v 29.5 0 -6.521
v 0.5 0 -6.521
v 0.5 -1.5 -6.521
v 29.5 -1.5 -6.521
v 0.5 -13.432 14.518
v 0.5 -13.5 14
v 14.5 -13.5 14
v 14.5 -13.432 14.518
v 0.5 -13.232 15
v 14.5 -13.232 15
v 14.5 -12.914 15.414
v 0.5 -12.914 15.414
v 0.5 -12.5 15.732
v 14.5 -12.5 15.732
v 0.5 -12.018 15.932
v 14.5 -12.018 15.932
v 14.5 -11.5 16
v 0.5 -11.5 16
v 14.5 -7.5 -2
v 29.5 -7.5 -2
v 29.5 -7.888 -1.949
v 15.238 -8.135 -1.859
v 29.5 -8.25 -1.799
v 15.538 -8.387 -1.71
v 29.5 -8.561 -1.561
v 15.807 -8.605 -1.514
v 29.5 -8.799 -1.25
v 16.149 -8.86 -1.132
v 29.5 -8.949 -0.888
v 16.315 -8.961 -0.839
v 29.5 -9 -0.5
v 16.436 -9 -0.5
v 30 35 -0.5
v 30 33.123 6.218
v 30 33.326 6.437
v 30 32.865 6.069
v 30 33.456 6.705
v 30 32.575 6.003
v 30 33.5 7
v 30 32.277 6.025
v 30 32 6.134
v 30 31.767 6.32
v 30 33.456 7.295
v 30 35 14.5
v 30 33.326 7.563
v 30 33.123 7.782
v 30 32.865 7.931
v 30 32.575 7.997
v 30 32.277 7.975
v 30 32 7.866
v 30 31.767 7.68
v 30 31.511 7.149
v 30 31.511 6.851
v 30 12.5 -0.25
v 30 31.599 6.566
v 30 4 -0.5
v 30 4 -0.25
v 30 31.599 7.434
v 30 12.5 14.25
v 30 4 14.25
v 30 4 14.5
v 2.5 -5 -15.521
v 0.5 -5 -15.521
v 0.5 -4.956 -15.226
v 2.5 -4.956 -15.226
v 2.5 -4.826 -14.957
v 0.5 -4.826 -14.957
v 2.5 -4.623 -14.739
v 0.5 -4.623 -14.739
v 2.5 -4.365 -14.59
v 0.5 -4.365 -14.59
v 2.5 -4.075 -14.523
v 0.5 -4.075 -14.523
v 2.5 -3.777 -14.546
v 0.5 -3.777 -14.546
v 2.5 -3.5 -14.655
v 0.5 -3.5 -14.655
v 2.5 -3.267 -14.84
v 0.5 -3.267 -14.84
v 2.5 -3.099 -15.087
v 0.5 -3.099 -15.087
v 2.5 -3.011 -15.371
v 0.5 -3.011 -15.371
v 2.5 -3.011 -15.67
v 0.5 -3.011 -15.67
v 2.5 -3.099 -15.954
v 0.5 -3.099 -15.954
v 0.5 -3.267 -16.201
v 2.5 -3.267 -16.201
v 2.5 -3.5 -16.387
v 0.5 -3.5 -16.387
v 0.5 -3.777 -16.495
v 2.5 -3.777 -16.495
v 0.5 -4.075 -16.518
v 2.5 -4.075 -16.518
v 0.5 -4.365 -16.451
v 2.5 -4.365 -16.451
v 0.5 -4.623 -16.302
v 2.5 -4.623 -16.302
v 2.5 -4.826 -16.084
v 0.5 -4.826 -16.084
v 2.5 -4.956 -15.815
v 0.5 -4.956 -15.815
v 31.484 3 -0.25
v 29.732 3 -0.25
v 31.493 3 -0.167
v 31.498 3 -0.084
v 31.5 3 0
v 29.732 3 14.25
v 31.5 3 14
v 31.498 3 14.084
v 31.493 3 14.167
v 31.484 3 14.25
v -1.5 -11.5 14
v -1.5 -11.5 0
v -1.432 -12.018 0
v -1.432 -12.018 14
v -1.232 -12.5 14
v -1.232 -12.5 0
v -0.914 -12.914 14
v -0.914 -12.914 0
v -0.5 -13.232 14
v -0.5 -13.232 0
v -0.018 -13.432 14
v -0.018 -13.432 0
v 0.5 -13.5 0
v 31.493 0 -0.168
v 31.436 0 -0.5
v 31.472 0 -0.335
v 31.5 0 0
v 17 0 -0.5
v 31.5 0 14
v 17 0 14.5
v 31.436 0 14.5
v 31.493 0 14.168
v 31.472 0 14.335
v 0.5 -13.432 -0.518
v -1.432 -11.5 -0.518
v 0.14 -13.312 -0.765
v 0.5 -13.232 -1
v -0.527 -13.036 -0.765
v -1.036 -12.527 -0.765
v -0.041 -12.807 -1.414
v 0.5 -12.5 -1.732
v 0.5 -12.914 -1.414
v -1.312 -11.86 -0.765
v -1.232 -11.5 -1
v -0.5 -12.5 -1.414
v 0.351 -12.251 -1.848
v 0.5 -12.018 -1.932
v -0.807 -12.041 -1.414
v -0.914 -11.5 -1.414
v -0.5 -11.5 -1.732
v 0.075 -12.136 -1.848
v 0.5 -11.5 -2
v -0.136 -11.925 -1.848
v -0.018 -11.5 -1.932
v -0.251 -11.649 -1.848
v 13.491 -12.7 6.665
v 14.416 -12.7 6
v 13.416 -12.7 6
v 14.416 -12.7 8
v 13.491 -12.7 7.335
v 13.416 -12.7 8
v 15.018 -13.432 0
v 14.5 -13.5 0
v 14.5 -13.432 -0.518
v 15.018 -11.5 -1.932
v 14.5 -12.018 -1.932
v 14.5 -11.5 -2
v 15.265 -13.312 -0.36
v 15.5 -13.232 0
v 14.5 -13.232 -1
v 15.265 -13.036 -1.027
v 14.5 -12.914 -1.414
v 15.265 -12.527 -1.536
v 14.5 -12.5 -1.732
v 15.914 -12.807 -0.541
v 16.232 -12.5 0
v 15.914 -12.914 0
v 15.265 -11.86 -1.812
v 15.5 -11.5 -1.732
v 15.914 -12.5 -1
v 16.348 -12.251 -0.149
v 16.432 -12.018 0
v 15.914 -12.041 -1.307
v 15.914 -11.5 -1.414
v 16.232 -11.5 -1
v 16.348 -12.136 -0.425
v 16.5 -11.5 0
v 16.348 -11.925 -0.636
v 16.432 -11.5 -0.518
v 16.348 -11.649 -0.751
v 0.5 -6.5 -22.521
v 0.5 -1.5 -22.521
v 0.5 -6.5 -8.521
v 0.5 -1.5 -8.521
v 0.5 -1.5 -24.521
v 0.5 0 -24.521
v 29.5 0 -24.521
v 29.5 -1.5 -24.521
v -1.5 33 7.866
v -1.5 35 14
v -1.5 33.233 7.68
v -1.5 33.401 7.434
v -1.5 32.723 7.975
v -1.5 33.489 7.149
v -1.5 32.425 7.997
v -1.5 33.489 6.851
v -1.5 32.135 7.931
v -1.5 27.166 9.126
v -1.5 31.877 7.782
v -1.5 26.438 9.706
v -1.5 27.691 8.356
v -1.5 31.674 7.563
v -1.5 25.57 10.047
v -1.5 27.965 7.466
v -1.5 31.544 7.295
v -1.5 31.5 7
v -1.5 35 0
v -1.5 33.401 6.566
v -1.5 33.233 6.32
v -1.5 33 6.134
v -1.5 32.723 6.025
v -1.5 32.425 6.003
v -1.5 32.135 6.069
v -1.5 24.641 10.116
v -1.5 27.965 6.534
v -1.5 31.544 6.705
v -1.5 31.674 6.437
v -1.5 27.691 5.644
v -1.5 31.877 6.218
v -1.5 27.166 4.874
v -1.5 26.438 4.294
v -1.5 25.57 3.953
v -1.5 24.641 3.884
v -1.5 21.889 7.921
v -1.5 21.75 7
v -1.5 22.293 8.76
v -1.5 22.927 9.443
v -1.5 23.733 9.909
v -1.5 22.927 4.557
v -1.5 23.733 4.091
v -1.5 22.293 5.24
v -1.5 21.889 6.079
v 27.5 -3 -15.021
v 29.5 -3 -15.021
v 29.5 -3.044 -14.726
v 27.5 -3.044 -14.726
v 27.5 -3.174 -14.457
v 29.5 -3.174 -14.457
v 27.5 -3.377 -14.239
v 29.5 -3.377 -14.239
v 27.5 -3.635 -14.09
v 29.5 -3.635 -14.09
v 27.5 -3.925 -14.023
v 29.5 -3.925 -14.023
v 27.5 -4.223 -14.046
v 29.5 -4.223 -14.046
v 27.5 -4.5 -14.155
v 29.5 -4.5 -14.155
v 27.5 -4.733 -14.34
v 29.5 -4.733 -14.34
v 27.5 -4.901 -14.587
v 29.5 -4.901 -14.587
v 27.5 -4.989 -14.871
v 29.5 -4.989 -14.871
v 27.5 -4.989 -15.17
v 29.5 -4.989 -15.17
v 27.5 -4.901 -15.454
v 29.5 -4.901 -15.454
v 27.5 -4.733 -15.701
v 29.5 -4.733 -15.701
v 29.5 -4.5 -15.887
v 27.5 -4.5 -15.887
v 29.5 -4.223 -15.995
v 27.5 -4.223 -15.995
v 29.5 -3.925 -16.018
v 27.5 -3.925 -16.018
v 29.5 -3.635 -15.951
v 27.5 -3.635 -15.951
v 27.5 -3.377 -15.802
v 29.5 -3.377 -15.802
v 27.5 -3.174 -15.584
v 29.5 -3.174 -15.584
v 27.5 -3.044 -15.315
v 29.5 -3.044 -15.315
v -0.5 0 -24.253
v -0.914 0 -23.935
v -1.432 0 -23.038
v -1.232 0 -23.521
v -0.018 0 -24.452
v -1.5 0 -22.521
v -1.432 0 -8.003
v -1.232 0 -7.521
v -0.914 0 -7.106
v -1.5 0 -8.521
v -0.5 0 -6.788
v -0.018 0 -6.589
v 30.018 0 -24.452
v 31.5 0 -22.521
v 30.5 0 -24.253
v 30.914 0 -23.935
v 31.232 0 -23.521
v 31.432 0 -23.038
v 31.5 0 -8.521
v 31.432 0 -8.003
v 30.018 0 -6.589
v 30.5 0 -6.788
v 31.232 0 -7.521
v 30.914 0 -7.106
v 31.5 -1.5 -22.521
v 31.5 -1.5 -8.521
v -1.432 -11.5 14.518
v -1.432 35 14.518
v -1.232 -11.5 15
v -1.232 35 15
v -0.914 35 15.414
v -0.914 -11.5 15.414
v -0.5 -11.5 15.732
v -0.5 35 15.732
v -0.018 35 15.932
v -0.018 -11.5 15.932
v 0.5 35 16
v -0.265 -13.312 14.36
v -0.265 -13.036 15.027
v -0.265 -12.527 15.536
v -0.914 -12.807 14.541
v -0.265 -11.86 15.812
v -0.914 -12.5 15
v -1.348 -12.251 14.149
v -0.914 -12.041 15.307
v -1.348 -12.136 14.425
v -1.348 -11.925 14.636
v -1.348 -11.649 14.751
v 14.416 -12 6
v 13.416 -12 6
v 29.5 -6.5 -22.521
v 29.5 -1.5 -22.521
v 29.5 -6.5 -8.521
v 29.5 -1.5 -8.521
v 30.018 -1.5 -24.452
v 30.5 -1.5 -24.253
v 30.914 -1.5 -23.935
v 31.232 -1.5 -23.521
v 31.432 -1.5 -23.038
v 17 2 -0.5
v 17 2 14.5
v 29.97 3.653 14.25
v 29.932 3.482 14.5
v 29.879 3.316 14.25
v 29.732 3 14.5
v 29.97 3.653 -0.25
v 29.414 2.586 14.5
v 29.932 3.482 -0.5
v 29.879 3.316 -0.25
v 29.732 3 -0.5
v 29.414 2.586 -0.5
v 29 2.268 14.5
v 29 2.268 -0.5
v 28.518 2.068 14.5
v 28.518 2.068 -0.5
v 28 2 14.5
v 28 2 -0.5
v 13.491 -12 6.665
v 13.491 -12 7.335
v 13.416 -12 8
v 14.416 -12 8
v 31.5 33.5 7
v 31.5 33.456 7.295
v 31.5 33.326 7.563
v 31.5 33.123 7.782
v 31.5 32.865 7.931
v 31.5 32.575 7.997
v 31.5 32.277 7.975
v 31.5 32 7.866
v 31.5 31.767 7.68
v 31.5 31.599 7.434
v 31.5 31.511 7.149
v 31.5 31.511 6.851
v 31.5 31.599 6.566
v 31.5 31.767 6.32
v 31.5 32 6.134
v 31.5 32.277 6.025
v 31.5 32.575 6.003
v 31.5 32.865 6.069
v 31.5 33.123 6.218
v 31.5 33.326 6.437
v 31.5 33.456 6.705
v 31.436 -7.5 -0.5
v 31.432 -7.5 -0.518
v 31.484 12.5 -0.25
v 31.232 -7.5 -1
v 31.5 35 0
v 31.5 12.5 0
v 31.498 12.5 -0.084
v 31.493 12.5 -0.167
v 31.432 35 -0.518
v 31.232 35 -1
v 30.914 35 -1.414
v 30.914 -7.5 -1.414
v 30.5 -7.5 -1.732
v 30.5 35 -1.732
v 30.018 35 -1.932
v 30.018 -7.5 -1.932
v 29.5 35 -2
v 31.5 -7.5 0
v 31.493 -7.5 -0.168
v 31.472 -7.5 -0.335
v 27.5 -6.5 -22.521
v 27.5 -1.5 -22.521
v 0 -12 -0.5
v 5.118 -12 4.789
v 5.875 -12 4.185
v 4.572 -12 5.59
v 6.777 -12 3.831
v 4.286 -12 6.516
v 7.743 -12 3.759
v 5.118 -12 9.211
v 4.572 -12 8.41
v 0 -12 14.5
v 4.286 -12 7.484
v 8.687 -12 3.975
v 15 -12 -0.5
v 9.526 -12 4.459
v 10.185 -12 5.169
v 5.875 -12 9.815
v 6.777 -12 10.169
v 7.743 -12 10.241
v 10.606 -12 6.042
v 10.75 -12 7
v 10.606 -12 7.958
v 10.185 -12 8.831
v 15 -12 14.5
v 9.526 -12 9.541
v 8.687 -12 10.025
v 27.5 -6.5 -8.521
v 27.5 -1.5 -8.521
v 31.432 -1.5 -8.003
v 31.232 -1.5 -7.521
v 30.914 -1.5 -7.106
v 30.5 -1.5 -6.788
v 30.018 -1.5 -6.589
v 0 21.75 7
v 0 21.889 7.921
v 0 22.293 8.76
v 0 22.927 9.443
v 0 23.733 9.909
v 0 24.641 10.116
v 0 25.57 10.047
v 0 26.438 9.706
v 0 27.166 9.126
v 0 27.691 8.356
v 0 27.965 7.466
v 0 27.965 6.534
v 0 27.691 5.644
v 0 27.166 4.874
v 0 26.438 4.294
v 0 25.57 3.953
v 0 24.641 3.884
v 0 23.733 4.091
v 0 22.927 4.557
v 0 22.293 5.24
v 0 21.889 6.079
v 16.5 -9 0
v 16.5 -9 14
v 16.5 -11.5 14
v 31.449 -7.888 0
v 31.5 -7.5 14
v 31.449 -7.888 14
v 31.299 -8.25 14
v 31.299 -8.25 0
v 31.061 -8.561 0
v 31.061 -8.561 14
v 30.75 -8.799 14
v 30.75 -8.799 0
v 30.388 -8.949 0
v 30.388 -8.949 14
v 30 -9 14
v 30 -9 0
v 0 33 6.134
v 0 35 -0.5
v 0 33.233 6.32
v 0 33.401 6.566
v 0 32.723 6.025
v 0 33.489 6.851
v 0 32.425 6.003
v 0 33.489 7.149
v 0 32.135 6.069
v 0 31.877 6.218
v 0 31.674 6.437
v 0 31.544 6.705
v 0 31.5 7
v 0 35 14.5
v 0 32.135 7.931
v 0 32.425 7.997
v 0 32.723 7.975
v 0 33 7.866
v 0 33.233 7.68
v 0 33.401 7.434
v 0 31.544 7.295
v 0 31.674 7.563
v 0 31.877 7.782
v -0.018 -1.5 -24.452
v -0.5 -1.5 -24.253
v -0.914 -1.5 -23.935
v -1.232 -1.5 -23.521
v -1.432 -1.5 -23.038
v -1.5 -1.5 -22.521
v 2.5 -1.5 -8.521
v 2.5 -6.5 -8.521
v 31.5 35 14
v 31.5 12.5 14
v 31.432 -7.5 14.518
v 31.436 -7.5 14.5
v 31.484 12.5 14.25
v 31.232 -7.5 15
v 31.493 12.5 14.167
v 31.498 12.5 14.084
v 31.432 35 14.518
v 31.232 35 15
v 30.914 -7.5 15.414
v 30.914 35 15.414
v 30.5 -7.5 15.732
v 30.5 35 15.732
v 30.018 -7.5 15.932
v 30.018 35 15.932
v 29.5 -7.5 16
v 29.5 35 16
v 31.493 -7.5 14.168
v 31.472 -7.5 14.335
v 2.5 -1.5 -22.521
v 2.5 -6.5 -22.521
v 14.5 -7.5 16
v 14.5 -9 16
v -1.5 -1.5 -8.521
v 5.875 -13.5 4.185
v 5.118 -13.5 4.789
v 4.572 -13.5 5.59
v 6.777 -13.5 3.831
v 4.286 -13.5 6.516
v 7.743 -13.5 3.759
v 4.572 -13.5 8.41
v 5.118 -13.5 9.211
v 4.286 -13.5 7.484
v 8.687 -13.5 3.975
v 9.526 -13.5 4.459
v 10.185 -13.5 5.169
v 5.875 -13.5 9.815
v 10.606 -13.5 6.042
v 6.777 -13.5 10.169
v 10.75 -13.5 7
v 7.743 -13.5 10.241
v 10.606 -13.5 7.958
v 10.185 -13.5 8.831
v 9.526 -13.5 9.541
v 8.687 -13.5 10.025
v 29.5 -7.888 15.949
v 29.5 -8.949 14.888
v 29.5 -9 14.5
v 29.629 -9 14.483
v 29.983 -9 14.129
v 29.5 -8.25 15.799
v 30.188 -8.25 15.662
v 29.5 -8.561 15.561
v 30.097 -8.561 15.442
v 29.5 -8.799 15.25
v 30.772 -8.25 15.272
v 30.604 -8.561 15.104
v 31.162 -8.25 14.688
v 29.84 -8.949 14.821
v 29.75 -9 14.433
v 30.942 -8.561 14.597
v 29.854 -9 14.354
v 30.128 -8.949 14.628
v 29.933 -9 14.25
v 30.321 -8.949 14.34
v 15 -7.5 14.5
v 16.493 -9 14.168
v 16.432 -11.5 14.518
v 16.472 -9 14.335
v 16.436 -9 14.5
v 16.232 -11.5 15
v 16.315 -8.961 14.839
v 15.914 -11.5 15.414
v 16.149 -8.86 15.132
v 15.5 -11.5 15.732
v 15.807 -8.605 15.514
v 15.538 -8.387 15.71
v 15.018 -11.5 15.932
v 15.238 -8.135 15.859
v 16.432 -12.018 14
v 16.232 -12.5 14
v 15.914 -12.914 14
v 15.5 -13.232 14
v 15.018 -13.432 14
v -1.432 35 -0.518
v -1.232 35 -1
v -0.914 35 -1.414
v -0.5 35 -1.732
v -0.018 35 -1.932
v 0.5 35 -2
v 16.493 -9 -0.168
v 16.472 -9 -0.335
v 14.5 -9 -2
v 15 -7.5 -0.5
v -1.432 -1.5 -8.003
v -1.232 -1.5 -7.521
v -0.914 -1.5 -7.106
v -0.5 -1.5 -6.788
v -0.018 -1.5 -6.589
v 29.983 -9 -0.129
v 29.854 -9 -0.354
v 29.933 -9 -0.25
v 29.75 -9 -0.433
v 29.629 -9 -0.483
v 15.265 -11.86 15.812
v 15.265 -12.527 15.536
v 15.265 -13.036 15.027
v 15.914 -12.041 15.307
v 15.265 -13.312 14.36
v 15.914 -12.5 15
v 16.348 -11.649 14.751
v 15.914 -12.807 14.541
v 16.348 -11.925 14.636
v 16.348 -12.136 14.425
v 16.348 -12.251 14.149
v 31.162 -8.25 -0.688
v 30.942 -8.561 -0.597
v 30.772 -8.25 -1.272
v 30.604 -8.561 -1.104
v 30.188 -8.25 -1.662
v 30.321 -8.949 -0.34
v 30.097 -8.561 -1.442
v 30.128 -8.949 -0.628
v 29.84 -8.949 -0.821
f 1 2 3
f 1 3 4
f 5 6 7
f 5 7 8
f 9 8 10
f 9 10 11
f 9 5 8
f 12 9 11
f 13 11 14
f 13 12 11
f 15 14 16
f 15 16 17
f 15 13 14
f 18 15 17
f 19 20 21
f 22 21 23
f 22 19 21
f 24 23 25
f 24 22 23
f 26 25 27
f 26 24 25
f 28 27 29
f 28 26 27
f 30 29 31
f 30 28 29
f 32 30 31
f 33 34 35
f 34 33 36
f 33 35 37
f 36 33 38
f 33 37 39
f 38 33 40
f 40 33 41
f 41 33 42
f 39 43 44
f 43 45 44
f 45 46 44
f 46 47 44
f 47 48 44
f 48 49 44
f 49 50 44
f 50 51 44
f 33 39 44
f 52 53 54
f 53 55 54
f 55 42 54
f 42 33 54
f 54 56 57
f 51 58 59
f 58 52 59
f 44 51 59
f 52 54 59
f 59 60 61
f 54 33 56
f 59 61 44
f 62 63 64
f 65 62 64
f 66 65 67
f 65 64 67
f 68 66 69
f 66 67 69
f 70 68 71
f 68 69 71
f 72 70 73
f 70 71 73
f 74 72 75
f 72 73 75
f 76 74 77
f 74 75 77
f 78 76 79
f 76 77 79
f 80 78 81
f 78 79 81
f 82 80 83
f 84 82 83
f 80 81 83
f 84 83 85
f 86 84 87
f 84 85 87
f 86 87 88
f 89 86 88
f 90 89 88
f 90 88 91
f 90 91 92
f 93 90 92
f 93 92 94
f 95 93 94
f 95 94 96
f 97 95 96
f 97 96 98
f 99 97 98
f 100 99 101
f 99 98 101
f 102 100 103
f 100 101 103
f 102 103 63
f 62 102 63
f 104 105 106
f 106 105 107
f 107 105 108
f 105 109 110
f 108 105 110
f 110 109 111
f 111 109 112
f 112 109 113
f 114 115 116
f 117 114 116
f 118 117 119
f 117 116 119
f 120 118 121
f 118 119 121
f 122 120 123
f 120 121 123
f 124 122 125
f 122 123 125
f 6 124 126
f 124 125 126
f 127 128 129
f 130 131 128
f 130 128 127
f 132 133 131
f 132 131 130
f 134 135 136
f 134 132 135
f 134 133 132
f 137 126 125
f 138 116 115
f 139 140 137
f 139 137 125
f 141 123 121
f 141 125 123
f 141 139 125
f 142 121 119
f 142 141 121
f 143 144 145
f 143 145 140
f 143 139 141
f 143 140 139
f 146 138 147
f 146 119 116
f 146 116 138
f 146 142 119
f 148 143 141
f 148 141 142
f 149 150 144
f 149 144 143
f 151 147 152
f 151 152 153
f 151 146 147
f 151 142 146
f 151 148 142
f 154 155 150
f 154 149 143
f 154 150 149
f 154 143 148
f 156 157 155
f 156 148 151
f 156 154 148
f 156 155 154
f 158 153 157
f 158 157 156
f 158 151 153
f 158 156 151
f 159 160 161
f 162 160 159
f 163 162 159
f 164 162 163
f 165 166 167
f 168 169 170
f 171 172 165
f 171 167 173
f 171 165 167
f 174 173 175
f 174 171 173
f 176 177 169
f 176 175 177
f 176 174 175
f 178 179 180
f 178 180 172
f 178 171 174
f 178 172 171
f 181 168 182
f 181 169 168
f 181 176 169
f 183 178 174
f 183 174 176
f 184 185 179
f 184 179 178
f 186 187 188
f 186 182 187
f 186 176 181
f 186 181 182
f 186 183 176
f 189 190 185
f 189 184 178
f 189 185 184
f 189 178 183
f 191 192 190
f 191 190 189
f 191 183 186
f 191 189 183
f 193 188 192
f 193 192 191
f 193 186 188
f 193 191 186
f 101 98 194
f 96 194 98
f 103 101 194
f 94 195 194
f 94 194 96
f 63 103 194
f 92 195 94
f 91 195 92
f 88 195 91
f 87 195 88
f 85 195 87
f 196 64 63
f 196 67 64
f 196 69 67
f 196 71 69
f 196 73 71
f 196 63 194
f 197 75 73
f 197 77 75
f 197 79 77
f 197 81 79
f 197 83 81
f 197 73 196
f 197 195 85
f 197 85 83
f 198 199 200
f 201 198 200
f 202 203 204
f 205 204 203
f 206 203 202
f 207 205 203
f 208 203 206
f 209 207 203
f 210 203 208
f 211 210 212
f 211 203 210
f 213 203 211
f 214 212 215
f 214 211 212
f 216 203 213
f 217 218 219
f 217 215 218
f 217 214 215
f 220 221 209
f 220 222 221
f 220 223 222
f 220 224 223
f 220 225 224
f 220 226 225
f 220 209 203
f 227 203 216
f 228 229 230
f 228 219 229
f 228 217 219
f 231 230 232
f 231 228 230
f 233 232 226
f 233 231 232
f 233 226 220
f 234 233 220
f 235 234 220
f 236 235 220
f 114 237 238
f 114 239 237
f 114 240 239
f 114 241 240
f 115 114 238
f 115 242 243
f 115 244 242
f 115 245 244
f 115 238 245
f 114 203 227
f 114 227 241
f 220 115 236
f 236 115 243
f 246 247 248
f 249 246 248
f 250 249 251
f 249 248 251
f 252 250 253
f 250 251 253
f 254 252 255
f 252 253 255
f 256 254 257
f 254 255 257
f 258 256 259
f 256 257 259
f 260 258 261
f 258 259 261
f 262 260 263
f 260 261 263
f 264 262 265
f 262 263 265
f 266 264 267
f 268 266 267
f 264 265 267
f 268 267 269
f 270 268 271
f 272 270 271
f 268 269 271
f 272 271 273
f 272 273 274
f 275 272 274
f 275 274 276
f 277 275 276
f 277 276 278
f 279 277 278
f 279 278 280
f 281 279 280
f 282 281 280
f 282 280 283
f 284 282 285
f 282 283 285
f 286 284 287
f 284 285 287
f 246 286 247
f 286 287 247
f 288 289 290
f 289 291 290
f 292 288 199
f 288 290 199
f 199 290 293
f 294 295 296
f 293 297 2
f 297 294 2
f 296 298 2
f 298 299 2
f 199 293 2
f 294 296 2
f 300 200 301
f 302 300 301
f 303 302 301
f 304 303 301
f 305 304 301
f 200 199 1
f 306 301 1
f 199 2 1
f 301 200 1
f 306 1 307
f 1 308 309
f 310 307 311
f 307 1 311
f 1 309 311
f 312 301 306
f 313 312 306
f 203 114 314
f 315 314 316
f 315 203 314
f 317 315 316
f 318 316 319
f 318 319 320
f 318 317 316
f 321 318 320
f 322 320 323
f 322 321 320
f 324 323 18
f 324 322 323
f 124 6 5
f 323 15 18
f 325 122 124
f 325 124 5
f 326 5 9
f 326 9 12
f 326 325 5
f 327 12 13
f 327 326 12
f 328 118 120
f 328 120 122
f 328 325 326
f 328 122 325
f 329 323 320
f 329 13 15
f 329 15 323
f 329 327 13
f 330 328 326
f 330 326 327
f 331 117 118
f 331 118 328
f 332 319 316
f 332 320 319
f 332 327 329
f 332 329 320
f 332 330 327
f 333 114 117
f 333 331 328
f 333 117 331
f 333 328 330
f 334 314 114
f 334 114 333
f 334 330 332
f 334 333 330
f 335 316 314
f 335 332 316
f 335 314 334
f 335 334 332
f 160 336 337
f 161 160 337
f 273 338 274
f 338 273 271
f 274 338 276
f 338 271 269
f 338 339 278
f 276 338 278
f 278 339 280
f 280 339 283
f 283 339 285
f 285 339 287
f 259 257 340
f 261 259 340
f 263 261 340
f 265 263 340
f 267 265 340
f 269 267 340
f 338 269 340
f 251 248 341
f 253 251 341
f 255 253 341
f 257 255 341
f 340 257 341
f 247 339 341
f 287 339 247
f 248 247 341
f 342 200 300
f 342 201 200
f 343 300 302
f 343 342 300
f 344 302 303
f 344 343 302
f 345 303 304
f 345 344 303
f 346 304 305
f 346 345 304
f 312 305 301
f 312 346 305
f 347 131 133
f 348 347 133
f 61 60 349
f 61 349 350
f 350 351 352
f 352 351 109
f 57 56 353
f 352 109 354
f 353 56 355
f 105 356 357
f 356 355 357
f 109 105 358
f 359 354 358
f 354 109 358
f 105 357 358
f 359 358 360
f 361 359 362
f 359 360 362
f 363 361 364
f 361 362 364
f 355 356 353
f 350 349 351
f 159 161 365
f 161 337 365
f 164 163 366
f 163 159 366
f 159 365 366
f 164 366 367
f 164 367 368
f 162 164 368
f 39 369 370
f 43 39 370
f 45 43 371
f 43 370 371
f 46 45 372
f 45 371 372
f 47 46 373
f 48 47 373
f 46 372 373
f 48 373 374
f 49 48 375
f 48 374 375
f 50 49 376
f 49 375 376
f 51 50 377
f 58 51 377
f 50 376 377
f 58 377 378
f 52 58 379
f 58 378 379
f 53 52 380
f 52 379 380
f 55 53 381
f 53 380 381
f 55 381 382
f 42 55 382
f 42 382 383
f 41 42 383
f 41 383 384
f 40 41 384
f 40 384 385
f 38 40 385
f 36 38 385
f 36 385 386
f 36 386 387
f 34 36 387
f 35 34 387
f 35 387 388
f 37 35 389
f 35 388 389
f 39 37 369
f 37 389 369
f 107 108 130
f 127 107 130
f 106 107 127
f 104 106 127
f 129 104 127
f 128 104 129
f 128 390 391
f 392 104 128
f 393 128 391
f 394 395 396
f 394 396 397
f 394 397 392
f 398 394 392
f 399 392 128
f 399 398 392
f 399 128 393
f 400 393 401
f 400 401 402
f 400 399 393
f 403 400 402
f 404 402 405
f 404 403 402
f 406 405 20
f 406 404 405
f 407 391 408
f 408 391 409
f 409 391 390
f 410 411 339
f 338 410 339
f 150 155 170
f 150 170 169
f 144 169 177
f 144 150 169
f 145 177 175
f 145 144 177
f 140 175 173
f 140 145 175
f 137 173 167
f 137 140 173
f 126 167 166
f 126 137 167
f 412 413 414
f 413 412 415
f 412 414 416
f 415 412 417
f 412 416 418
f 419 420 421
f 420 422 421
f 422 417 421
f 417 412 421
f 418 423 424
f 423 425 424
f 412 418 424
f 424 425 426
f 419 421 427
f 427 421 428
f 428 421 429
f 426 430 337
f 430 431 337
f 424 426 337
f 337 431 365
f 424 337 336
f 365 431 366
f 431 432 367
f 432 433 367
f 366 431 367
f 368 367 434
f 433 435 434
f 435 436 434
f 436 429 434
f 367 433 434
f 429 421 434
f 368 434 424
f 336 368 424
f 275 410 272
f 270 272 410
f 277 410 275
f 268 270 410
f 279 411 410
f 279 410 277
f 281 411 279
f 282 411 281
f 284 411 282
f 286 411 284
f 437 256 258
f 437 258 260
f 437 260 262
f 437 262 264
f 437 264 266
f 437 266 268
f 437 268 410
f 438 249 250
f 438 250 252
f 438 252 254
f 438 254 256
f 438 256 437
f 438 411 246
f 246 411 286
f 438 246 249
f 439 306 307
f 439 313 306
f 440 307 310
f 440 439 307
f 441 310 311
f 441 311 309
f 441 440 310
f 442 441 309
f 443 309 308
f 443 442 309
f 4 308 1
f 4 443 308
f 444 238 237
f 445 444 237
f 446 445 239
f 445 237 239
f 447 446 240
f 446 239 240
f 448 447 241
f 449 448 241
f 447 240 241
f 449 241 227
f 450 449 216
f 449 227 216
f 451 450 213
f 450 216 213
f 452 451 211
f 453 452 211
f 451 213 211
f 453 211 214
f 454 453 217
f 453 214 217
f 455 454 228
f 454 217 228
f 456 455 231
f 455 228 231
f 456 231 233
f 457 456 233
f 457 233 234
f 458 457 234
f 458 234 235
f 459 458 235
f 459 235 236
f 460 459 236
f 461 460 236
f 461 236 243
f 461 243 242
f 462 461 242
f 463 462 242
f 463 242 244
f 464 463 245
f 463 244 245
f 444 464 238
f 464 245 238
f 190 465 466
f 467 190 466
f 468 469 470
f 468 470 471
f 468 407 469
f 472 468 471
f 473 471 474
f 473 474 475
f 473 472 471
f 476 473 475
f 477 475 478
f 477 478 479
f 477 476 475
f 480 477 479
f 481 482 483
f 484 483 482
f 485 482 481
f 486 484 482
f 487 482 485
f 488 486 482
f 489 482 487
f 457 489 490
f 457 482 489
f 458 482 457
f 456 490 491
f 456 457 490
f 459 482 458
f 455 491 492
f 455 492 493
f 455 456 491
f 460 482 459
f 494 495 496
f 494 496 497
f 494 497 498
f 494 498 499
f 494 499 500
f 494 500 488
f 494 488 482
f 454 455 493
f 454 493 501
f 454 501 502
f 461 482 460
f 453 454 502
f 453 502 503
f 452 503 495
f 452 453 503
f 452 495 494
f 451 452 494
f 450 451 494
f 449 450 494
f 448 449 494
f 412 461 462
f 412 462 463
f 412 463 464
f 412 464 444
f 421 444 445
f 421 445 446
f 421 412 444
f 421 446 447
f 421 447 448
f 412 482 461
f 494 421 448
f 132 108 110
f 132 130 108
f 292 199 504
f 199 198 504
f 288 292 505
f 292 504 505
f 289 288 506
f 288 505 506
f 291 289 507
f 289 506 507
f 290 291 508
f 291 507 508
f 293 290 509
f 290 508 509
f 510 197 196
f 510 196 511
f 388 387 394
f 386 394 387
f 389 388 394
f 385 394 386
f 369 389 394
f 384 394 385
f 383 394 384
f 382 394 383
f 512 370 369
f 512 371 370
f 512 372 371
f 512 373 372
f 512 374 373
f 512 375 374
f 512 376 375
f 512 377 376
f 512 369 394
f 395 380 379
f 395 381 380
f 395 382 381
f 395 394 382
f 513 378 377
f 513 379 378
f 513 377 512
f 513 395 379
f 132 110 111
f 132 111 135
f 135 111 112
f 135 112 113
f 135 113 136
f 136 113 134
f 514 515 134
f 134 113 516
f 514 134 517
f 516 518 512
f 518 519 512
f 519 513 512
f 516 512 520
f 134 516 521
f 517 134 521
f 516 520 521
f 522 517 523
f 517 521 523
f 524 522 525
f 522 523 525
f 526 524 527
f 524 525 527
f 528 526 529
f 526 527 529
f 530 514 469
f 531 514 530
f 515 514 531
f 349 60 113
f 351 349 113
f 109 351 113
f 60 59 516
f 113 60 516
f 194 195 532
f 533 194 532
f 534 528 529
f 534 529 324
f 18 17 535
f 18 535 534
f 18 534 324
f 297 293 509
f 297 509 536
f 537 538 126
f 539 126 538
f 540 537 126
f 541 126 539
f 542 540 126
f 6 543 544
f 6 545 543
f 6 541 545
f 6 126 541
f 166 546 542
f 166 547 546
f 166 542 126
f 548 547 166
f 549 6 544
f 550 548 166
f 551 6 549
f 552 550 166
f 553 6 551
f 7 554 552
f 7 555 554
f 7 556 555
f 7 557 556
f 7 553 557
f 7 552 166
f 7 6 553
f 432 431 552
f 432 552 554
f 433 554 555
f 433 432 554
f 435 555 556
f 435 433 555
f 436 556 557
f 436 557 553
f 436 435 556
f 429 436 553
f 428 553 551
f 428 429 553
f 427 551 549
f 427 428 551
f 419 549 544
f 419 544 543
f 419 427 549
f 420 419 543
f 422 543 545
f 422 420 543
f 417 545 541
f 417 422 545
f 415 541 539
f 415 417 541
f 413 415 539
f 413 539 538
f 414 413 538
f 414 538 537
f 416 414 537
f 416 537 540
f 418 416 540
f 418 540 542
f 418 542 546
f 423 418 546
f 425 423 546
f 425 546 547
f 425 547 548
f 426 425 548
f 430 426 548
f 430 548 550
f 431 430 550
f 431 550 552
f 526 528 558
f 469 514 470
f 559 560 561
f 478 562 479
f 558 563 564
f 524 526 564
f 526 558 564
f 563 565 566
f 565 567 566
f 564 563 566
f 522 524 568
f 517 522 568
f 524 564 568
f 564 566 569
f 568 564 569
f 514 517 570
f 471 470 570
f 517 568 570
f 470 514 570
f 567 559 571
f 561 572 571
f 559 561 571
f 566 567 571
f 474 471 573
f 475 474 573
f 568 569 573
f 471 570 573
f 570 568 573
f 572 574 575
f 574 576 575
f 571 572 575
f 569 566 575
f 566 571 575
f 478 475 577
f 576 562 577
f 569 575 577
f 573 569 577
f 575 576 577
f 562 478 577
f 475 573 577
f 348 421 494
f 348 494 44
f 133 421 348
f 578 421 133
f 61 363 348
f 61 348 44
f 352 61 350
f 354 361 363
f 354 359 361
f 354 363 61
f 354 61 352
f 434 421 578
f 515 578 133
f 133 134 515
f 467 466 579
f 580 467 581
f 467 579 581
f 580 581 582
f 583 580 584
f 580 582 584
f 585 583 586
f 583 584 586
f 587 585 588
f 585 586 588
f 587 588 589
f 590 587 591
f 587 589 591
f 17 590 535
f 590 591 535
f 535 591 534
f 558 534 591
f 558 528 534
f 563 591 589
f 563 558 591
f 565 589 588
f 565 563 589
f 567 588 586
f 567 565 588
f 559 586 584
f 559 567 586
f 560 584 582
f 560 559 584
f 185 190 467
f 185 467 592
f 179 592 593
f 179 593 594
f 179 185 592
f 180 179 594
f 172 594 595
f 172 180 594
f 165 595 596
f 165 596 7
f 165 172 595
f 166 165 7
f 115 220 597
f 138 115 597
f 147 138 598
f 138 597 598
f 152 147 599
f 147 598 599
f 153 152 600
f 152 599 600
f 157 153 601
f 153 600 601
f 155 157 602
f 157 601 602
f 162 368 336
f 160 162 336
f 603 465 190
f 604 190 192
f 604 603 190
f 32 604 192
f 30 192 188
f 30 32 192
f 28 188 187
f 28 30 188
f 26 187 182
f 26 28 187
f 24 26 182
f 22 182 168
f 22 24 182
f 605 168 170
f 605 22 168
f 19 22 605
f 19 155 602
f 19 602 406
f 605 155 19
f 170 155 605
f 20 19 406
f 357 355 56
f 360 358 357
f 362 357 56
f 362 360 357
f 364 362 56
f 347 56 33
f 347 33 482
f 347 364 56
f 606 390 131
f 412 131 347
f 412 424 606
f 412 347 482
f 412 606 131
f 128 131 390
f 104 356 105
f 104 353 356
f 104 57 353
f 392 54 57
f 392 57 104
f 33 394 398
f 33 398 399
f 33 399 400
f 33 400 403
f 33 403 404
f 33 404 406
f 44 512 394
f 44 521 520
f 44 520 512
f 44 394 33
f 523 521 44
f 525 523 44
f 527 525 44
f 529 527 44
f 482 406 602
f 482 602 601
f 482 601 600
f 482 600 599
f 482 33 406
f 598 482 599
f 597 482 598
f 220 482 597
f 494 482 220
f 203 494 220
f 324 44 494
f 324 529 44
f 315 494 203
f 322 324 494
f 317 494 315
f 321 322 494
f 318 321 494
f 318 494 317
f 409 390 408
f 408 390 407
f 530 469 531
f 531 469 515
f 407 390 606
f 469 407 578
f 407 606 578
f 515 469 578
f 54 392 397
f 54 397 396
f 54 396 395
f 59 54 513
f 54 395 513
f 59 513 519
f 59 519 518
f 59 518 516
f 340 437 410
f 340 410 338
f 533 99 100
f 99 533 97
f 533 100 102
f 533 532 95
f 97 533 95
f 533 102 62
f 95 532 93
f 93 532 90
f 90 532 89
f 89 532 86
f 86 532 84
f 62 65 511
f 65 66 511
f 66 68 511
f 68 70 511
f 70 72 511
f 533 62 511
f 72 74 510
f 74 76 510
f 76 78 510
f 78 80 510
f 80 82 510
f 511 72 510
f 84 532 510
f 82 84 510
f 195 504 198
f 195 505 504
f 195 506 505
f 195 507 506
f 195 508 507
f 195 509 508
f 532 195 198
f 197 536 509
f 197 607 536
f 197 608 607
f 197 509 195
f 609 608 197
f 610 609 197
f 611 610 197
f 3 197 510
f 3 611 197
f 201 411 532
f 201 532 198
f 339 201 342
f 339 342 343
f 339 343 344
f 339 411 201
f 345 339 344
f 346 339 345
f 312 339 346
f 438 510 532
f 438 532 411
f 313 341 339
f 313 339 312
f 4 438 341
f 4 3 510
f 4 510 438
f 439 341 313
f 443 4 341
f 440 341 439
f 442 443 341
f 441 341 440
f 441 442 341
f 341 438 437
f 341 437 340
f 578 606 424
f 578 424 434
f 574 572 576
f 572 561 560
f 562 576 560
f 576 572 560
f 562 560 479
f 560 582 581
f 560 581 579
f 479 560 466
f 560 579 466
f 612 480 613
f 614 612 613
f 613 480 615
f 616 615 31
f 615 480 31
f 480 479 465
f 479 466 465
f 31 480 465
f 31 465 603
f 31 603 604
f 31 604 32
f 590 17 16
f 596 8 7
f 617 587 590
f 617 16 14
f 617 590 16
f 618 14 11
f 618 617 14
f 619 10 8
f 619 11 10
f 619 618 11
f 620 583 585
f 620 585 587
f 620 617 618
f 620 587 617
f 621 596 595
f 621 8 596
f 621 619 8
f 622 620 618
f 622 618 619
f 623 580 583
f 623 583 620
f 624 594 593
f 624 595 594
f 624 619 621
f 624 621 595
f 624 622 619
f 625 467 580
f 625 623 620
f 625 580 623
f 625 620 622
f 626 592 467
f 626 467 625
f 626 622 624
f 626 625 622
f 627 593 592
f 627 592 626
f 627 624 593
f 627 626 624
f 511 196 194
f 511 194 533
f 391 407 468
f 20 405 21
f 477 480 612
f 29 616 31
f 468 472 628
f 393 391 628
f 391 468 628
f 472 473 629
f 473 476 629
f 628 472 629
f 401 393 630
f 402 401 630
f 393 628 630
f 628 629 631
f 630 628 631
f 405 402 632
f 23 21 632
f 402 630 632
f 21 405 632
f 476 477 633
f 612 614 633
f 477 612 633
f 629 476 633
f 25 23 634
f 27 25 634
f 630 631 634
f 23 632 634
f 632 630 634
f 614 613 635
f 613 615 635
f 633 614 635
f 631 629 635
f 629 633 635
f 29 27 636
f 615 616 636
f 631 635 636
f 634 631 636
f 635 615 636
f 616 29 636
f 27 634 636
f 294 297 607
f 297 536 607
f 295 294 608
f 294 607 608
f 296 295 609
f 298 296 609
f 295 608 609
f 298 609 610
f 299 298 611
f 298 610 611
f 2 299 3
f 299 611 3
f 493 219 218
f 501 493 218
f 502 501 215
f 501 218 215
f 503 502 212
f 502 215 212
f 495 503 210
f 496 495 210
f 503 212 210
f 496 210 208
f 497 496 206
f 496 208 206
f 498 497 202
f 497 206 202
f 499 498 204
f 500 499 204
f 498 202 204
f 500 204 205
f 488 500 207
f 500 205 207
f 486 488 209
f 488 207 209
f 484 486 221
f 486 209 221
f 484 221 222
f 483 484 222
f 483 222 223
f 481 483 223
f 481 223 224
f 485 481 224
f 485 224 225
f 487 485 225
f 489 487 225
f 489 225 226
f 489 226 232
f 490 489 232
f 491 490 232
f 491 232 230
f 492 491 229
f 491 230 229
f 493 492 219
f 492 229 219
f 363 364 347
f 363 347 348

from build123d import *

# Parameters (mm, degrees)
F0_W          = 15
F0_H          = 15
F1_DEPTH      = 13.5
F0_R          = 6
F2_DEPTH      = 13.5
F0_R_2        = 4.5
F3_DEPTH      = 12
F5_DEPTH      = 15
F6_DEPTH      = 1.5
F7_DEPTH      = 35
F8_W          = 1.5
F8_H          = 15
F9_DEPTH      = 15
F10_W         = 2
F10_H         = 15
F11_DEPTH     = 15
F13_DEPTH     = 35
F14_W         = 1.5
F14_H         = 15
F15_DEPTH     = 33
F16_W         = 33
F16_H         = 18
F17_DEPTH     = 1.5
F16_W_2       = 2
F16_H_2       = 14
F18_DEPTH     = 6.5
F20_R         = 1
F21_DEPTH     = 1.5
F22_R         = 1
F23_DEPTH     = 1.5
F20_R_2       = 3.125
F24_DEPTH     = 1.5
F26_DEPTH     = 0.7
F27_R         = 1
F28_DEPTH     = 2
F29_DEPTH     = 5
F30_DEPTH     = 2
F32_DEPTH     = 13.5
F33_DEPTH     = 12
F0_R_3        = 3.25
F34_DEPTH     = 13.5
F35_DEPTH     = 12
F37_DEPTH     = 1.5
F38_T4_DEPTH  = 15
F38_T10_DEPTH = 15
F38_T16_DEPTH = 15
F38_T23_DEPTH = 15
F38_T29_DEPTH = 15
F38_T32_DEPTH = 2.5
F38_T34_DEPTH = 14
F38_T36_DEPTH = 14
F38_T38_DEPTH = 51.5
F38_T40_DEPTH = 54
F38_S44_W     = 2
F38_S44_H     = 2
F38_T45_DEPTH = 2
F38_S50_W     = 2
F38_S50_H     = 2
F38_T51_DEPTH = 2
F38_S56_W     = 2
F38_S56_H     = 2
F38_T57_DEPTH = 2
F38_S62_W     = 2
F38_S62_H     = 2
F38_T63_DEPTH = 2
F38_2_F1_R    = 2
F38_2_F2_R    = 2
F38_2_F3_R    = 2
F38_2_F4_R    = 2
F19_R         = 1
F40_DEPTH     = 2
F42_R         = 1.49999


# Not quite as in the source:
# - a fillet or chamfer that OpenCascade refuses, or shapes differently, is made with other operations: its cross-section is extruded or revolved along the edge and cut away or added
# - two fillets or chamfers of one size are made in one step
# - a fillet or chamfer is up to 0.001 mm smaller than in the source, because OpenCascade refuses the exact size
# - a feature names something its author has since deleted; it is built from what else it names


with BuildPart() as f1:
    # F0 (on Front) → F1 (new body)
    with BuildSketch(Plane.XZ):
        Polygon((16.5, 14.5), (16.5, 16), (-1.5, 16), (-1.5, -2), (16.5, -2), (16.5, -0.5), align=None)
        with Locations((7.5, 7)):
            Rectangle(F0_W, F0_H, mode=Mode.SUBTRACT)
    extrude(amount=F1_DEPTH)

    # F0 (on Front) → F2 (join)
    with BuildSketch(Plane.XZ):
        with Locations((7.5, 7)):
            Rectangle(F0_W, F0_H)
        with Locations((7.5, 7)):
            Circle(F0_R, mode=Mode.SUBTRACT)
    extrude(amount=F2_DEPTH)

    # F0 (on Front) → F3 (cut)
    with BuildSketch(Plane.XZ):
        with Locations((7.5, 7)):
            Rectangle(F0_W, F0_H)
        with Locations((7.5, 7)):
            Circle(F0_R, mode=Mode.SUBTRACT)
        with Locations((7.5, 7)):
            Circle(F0_R)
        with Locations((7.5, 7)):
            Circle(F0_R_2, mode=Mode.SUBTRACT)
    extrude(amount=F3_DEPTH, mode=Mode.SUBTRACT)

    # F4 (on face) → F5 (join)
    with BuildSketch(Plane.YZ.offset(16.5)):
        Polygon((0, -2), (0, -0.5), (-7.5, -0.5), (-7.5, 14.5), (0, 14.5), (0, 16), (-9, 16), (-9, -2), align=None)
    extrude(amount=F5_DEPTH)

    # F6 (cut): a face of the model
    f6_faces = [f1.faces().sort_by_distance(p)[0] for p in [
        (16.5, -3.75, 7),
    ]]
    extrude(f6_faces, amount=-F6_DEPTH, mode=Mode.SUBTRACT)

    # F0 (on Front) → F7 (join)
    with BuildSketch(Plane.XZ):
        Polygon((16.5, 14.5), (16.5, 16), (-1.5, 16), (-1.5, -2), (16.5, -2), (16.5, -0.5), align=None)
        with Locations((7.5, 7)):
            Rectangle(F0_W, F0_H, mode=Mode.SUBTRACT)
        Polygon((33, 16), (16.5, 16), (16.5, 14.5), (31.5, 14.5), (31.5, -0.5), (16.5, -0.5), (16.5, -2), (33, -2), align=None)
    extrude(amount=-F7_DEPTH)

    # F8 (on face) → F9 (cut)
    with BuildSketch(Plane(origin=(0, 35, 0), x_dir=(-1, 0, 0), z_dir=(0, 1, 0))):
        with Locations((-15.75, 7)):
            Rectangle(F8_W, F8_H)
    extrude(amount=-F9_DEPTH, mode=Mode.SUBTRACT)

    # F10 (on face) → F11 (join)
    with BuildSketch(Plane(origin=(31.5, 0, 0), x_dir=(0, -1, 0), z_dir=(-1, 0, 0))):
        with Locations((-1, 7)):
            Rectangle(F10_W, F10_H)
    extrude(amount=F11_DEPTH)

    # F12 (on face) → F13 (cut)
    with BuildSketch(Plane(origin=(0, 35, 0), x_dir=(-1, 0, 0), z_dir=(0, 1, 0))):
        Polygon((-31.5, -2), (-31.5, -0.5), (-31.5, 14.5), (-31.5, 16), (-33, 16), (-33, -2), align=None)
    extrude(amount=-F13_DEPTH, mode=Mode.SUBTRACT)

    # F14 (on face) → F15 (join)
    with BuildSketch(Plane(origin=(0, 2, 0), x_dir=(-1, 0, 0), z_dir=(0, 1, 0))):
        with Locations((-30.75, 7)):
            Rectangle(F14_W, F14_H)
    extrude(amount=F15_DEPTH)

    # F20 (on face) → F21 (cut)
    with BuildSketch(Plane(origin=(-1.5, 0, 0), x_dir=(0, -1, 0), z_dir=(-1, 0, 0))):
        with Locations((-32.5, 7)):
            Circle(F20_R)
    extrude(amount=-F21_DEPTH, mode=Mode.SUBTRACT)

    # F22 (on face) → F23 (cut)
    with BuildSketch(Plane.YZ.offset(31.5)):
        with Locations((32.5, 7)):
            Circle(F22_R)
    extrude(amount=-F23_DEPTH, mode=Mode.SUBTRACT)

    # F20 (on face) → F24 (cut)
    with BuildSketch(Plane(origin=(-1.5, 0, 0), x_dir=(0, -1, 0), z_dir=(-1, 0, 0))):
        with Locations((-24.875, 7)):
            Circle(F20_R_2)
    extrude(amount=-F24_DEPTH, mode=Mode.SUBTRACT)

    # F25 (on face) → F26 (cut)
    with BuildSketch(Plane(origin=(0, -12, 0), x_dir=(-1, 0, 0), z_dir=(0, 1, 0))):
        with BuildLine():
            Line((-14.4160797831, 6), (-13.4160797831, 6))
            ThreePointArc((-13.4160797831, 6), (-13.5, 7), (-13.4160797831, 8))
            Line((-13.4160797831, 8), (-14.4160797831, 8))
            Line((-14.4160797831, 8), (-14.4160797831, 7))
            Line((-14.4160797831, 7), (-14.4160797831, 6))
        make_face()
    extrude(amount=-F26_DEPTH, mode=Mode.SUBTRACT)

    # F29 (cut): a face of the model
    f29_faces = [f1.faces().sort_by_distance(p)[0] for p in [
        (15.75, 20, 7),
    ]]
    extrude(f29_faces, amount=-F29_DEPTH, mode=Mode.SUBTRACT)

    # F30 (cut): a face of the model
    f30_faces = [f1.faces().sort_by_distance(p)[0] for p in [
        (15, 7.5, 7),
    ]]
    extrude(f30_faces, amount=-F30_DEPTH, mode=Mode.SUBTRACT)

    # F31: union 

    # F0 (on Front) → F32 (join)
    with BuildSketch(Plane.XZ):
        with Locations((7.5, 7)):
            Circle(F0_R)
        with Locations((7.5, 7)):
            Circle(F0_R_2, mode=Mode.SUBTRACT)
    extrude(amount=F32_DEPTH)

    # F0 (on Front) → F33 (cut)
    with BuildSketch(Plane.XZ):
        with Locations((7.5, 7)):
            Circle(F0_R)
        with Locations((7.5, 7)):
            Circle(F0_R_2, mode=Mode.SUBTRACT)
    extrude(amount=F33_DEPTH, mode=Mode.SUBTRACT)

    # F0 (on Front) → F34 (join)
    with BuildSketch(Plane.XZ):
        with Locations((7.5, 7)):
            Circle(F0_R_2)
        with Locations((7.5, 7)):
            Circle(F0_R_3, mode=Mode.SUBTRACT)
    extrude(amount=F34_DEPTH)

    # F0 (on Front) → F35 (cut)
    with BuildSketch(Plane.XZ):
        with Locations((7.5, 7)):
            Circle(F0_R_2)
        with Locations((7.5, 7)):
            Circle(F0_R_3, mode=Mode.SUBTRACT)
    extrude(amount=F35_DEPTH, mode=Mode.SUBTRACT)

    # F36 (on face) → F37 (cut)
    with BuildSketch(Plane.YZ.offset(31.5)):
        Polygon((3, 14.25), (3, 7), (3, -0.25), (7.75, -0.25), (12.5, -0.25), (12.5, 7), (12.5, 14.25), (7.75, 14.25), align=None)
    extrude(amount=-F37_DEPTH, mode=Mode.SUBTRACT)

    # F38: fillet of radius 2 on 11 edges, made by hand


with BuildPart() as f17:
    # F16 (on Front) → F17 (new body)
    with BuildSketch(Plane.XZ):
        with Locations((15, -15.5205413848)):
            Rectangle(F16_W, F16_H)
        Polygon((29.5, -23.0205413848), (0.5, -23.0205413848), (0, -23.0205413848), (0, -8.0205413848), (0.5, -8.0205413848), (29.5, -8.0205413848), (30, -8.0205413848), (30, -23.0205413848), align=None, mode=Mode.SUBTRACT)
        Polygon((0.5, -22.5205413848), (0.5, -23.0205413848), (29.5, -23.0205413848), (29.5, -22.5205413848), (27.5, -22.5205413848), (27.5, -8.5205413848), (29.5, -8.5205413848), (29.5, -8.0205413848), (0.5, -8.0205413848), (0.5, -8.5205413848), (2.5, -8.5205413848), (2.5, -22.5205413848), align=None)
        Polygon((29.5, -22.5205413848), (29.5, -23.0205413848), (30, -23.0205413848), (30, -8.0205413848), (29.5, -8.0205413848), (29.5, -8.5205413848), align=None)
        Polygon((0, -23.0205413848), (0.5, -23.0205413848), (0.5, -22.5205413848), (0.5, -8.5205413848), (0.5, -8.0205413848), (0, -8.0205413848), align=None)
    extrude(amount=F17_DEPTH)

    # F16 (on Front) → F18 (join)
    with BuildSketch(Plane.XZ):
        with Locations((1.5, -15.5205413848)):
            Rectangle(F16_W_2, F16_H_2)
        with Locations((28.5, -15.5205413848)):
            Rectangle(F16_W_2, F16_H_2)
    extrude(amount=F18_DEPTH)

    # F27 (on face) → F28 (cut)
    with BuildSketch(Plane(origin=(0.5, 0, 0), x_dir=(0, -1, 0), z_dir=(-1, 0, 0))):
        with Locations((4, -15.5205413848)):
            Circle(F27_R)
    extrude(amount=-F28_DEPTH, mode=Mode.SUBTRACT)

    # F38#2: fillet of radius 2 on 4 edges, made by hand

    # F38_2_f1
    f38_2_f1_edges = [f17.edges().sort_by_distance(p)[0] for p in [
        (31.5, -0.75, -24.5205413848),
    ]]
    fillet(f38_2_f1_edges, radius=F38_2_F1_R)

    # F38_2_f2
    f38_2_f2_edges = [f17.edges().sort_by_distance(p)[0] for p in [
        (31.5, -0.75, -6.5205413848),
    ]]
    fillet(f38_2_f2_edges, radius=F38_2_F2_R)

    # F38_2_f3
    f38_2_f3_edges = [f17.edges().sort_by_distance(p)[0] for p in [
        (-1.5, -0.75, -24.5205413848),
    ]]
    fillet(f38_2_f3_edges, radius=F38_2_F3_R)

    # F38_2_f4
    f38_2_f4_edges = [f17.edges().sort_by_distance(p)[0] for p in [
        (-1.5, -0.75, -6.5205413848),
    ]]
    fillet(f38_2_f4_edges, radius=F38_2_F4_R)

    # F19 (on face) → F40 (cut)
    with BuildSketch(Plane.YZ.offset(29.5)):
        with Locations((-4, -15.0205413848)):
            Circle(F19_R)
    extrude(amount=-F40_DEPTH, mode=Mode.SUBTRACT)


with BuildPart() as f38_tool2:
    # F38_s3 → F38_t4 (new body)
    with BuildSketch(Plane.XY.offset(-0.5)):
        with BuildLine():
            ThreePointArc((30, 4), (29.4142135624, 2.5857864376), (28, 2))
            Line((28, 2), (30, 2))
            Line((30, 2), (30, 4))
        make_face()
    extrude(amount=F38_T4_DEPTH)

    split(bisect_by=Plane.XZ.offset(-3), keep=Keep.BOTTOM)

    split(bisect_by=Plane.XY.offset(-0.25), keep=Keep.BOTTOM)


with BuildPart() as f1_1:
    add(f1.part)

    # F38_t1: union F38_tool2
    add(f38_tool2.part)


with BuildPart() as f38_tool8:
    # F38_s9 → F38_t10 (new body)
    with BuildSketch(Plane.XY.offset(-0.5)):
        with BuildLine():
            ThreePointArc((30, 4), (29.4142135624, 2.5857864376), (28, 2))
            Line((28, 2), (30, 2))
            Line((30, 2), (30, 4))
        make_face()
    extrude(amount=F38_T10_DEPTH)

    split(bisect_by=Plane.XZ.offset(-3), keep=Keep.TOP)

    split(bisect_by=Plane.XY.offset(-0.25), keep=Keep.BOTTOM)


with BuildPart() as f1_2:
    add(f1_1.part)

    # F38_t7: union F38_tool8
    add(f38_tool8.part)


with BuildPart() as f38_tool14:
    # F38_s15 → F38_t16 (new body)
    with BuildSketch(Plane.XY.offset(-0.5)):
        with BuildLine():
            ThreePointArc((30, 4), (29.4142135624, 2.5857864376), (28, 2))
            Line((28, 2), (30, 2))
            Line((30, 2), (30, 4))
        make_face()
    extrude(amount=F38_T16_DEPTH)

    split(bisect_by=Plane.XZ.offset(-3), keep=Keep.TOP)

    split(bisect_by=Plane.XY.offset(-0.25), keep=Keep.TOP)

    split(bisect_by=Plane.XY.offset(14.25), keep=Keep.BOTTOM)


with BuildPart() as f1_3:
    add(f1_2.part)

    # F38_t13: union F38_tool14
    add(f38_tool14.part)


with BuildPart() as f38_tool21:
    # F38_s22 → F38_t23 (new body)
    with BuildSketch(Plane.XY.offset(-0.5)):
        with BuildLine():
            ThreePointArc((30, 4), (29.4142135624, 2.5857864376), (28, 2))
            Line((28, 2), (30, 2))
            Line((30, 2), (30, 4))
        make_face()
    extrude(amount=F38_T23_DEPTH)

    split(bisect_by=Plane.XZ.offset(-3), keep=Keep.BOTTOM)

    split(bisect_by=Plane.XY.offset(14.25), keep=Keep.TOP)


with BuildPart() as f1_4:
    add(f1_3.part)

    # F38_t20: union F38_tool21
    add(f38_tool21.part)


with BuildPart() as f38_tool27:
    # F38_s28 → F38_t29 (new body)
    with BuildSketch(Plane.XY.offset(-0.5)):
        with BuildLine():
            ThreePointArc((30, 4), (29.4142135624, 2.5857864376), (28, 2))
            Line((28, 2), (30, 2))
            Line((30, 2), (30, 4))
        make_face()
    extrude(amount=F38_T29_DEPTH)

    split(bisect_by=Plane.XZ.offset(-3), keep=Keep.TOP)

    split(bisect_by=Plane.XY.offset(14.25), keep=Keep.TOP)


with BuildPart() as f1_5:
    add(f1_4.part)

    # F38_t26: union F38_tool27
    add(f38_tool27.part)

    # F38_s33 → F38_t32 (cut)
    with BuildSketch(Plane.XZ.offset(9)):
        with BuildLine():
            ThreePointArc((16.5, 14), (15.9142135624, 15.4142135624), (14.5, 16))
            Line((14.5, 16), (16.5, 16))
            Line((16.5, 16), (16.5, 14))
        make_face()
        with BuildLine():
            ThreePointArc((16.5, 0), (15.9142135624, -1.4142135624), (14.5, -2))
            Line((14.5, -2), (16.5, -2))
            Line((16.5, -2), (16.5, 0))
        make_face()
    extrude(amount=F38_T32_DEPTH, mode=Mode.SUBTRACT)

    # F38_s35 → F38_t34 (cut)
    with BuildSketch(Plane.XY):
        with BuildLine():
            ThreePointArc((16.5, -11.5), (15.9142135624, -12.9142135624), (14.5, -13.5))
            Line((14.5, -13.5), (16.5, -13.5))
            Line((16.5, -13.5), (16.5, -11.5))
        make_face()
        with BuildLine():
            ThreePointArc((-1.5, -11.5), (-0.9142135624, -12.9142135624), (0.5, -13.5))
            Line((0.5, -13.5), (-1.5, -13.5))
            Line((-1.5, -13.5), (-1.5, -11.5))
        make_face()
    extrude(amount=F38_T34_DEPTH, mode=Mode.SUBTRACT)

    # F38_s37 → F38_t36 (cut)
    with BuildSketch(Plane.YZ.offset(0.5)):
        with BuildLine():
            ThreePointArc((-13.5, 14), (-12.9142135624, 15.4142135624), (-11.5, 16))
            Line((-11.5, 16), (-13.5, 16))
            Line((-13.5, 16), (-13.5, 14))
        make_face()
        with BuildLine():
            ThreePointArc((-11.5, -2), (-12.9142135624, -1.4142135624), (-13.5, 0))
            Line((-13.5, 0), (-13.5, -2))
            Line((-13.5, -2), (-11.5, -2))
        make_face()
    extrude(amount=F38_T36_DEPTH, mode=Mode.SUBTRACT)

    # F38_s39 → F38_t38 (cut)
    with BuildSketch(Plane.XZ.offset(-40)):
        with BuildLine():
            ThreePointArc((-1.5, 14), (-0.9142135624, 15.4142135624), (0.5, 16))
            Line((0.5, 16), (-1.5, 16))
            Line((-1.5, 16), (-1.5, 14))
        make_face()
        with BuildLine():
            ThreePointArc((-1.5, 0), (-0.9142135624, -1.4142135624), (0.5, -2))
            Line((0.5, -2), (-1.5, -2))
            Line((-1.5, -2), (-1.5, 0))
        make_face()
    extrude(amount=F38_T38_DEPTH, mode=Mode.SUBTRACT)

    # F38_s41 → F38_t40 (cut)
    with BuildSketch(Plane.XZ.offset(-40)):
        with BuildLine():
            ThreePointArc((31.5, 14), (30.9142135624, 15.4142135624), (29.5, 16))
            Line((29.5, 16), (31.5, 16))
            Line((31.5, 16), (31.5, 14))
        make_face()
        with BuildLine():
            ThreePointArc((31.5, 0), (30.9142135624, -1.4142135624), (29.5, -2))
            Line((29.5, -2), (31.5, -2))
            Line((31.5, -2), (31.5, 0))
        make_face()
    extrude(amount=F38_T40_DEPTH, mode=Mode.SUBTRACT)


with BuildPart() as f38_tool43:
    # F38_s44 → F38_t45 (new body)
    with BuildSketch(Plane.YZ.offset(14.5)):
        with Locations((-12.5, 15)):
            Rectangle(F38_S44_W, F38_S44_H)
    extrude(amount=F38_T45_DEPTH)

    # F38_s46 → F38_t47 (revolve, cut)
    with BuildSketch(Plane(origin=(14.5, -11.5, 14), x_dir=(0, 0.7071067812, -0.7071067812), z_dir=(0, -0.7071067812, -0.7071067812))):
        with BuildLine():
            ThreePointArc((0, -2), (2, 0), (0, 2))
            Line((0, 2), (0, -2))
        make_face()
    revolve(axis=Axis((14.5, -11.5, 14), (1, 0, 0)), mode=Mode.SUBTRACT)


with BuildPart() as f1_6:
    add(f1_5.part)

    # F38_t42: cut F38_tool43
    add(f38_tool43.part, mode=Mode.SUBTRACT)


with BuildPart() as f38_tool49:
    # F38_s50 → F38_t51 (new body)
    with BuildSketch(Plane.YZ.offset(14.5)):
        with Locations((-12.5, -1)):
            Rectangle(F38_S50_W, F38_S50_H)
    extrude(amount=F38_T51_DEPTH)

    # F38_s52 → F38_t53 (revolve, cut)
    with BuildSketch(Plane(origin=(14.5, -11.5, 0), x_dir=(0, 0.7071067812, 0.7071067812), z_dir=(0, 0.7071067812, -0.7071067812))):
        with BuildLine():
            ThreePointArc((0, -2), (2, 0), (0, 2))
            Line((0, 2), (0, -2))
        make_face()
    revolve(axis=Axis((14.5, -11.5, 0), (1, 0, 0)), mode=Mode.SUBTRACT)


with BuildPart() as f1_7:
    add(f1_6.part)

    # F38_t48: cut F38_tool49
    add(f38_tool49.part, mode=Mode.SUBTRACT)


with BuildPart() as f38_tool55:
    # F38_s56 → F38_t57 (new body)
    with BuildSketch(Plane.YZ.offset(0.5)):
        with Locations((-12.5, 15)):
            Rectangle(F38_S56_W, F38_S56_H)
    extrude(amount=-F38_T57_DEPTH)

    # F38_s58 → F38_t59 (revolve, cut)
    with BuildSketch(Plane(origin=(0.5, -11.5, 14), x_dir=(0, 0.7071067812, -0.7071067812), z_dir=(0, 0.7071067812, 0.7071067812))):
        with BuildLine():
            ThreePointArc((0, -2), (2, 0), (0, 2))
            Line((0, 2), (0, -2))
        make_face()
    revolve(axis=Axis((0.5, -11.5, 14), (-1, 0, 0)), mode=Mode.SUBTRACT)


with BuildPart() as f1_8:
    add(f1_7.part)

    # F38_t54: cut F38_tool55
    add(f38_tool55.part, mode=Mode.SUBTRACT)


with BuildPart() as f38_tool61:
    # F38_s62 → F38_t63 (new body)
    with BuildSketch(Plane.XY):
        with Locations((-0.5, -12.5)):
            Rectangle(F38_S62_W, F38_S62_H)
    extrude(amount=-F38_T63_DEPTH)

    # F38_s64 → F38_t65 (revolve, cut)
    with BuildSketch(Plane(origin=(0.5, -11.5, 0), x_dir=(0.7071067812, 0.7071067812, 0), z_dir=(-0.7071067812, 0.7071067812, 0))):
        with BuildLine():
            ThreePointArc((0, -2), (2, 0), (0, 2))
            Line((0, 2), (0, -2))
        make_face()
    revolve(axis=Axis((0.5, -11.5, 0), (0, 0, -1)), mode=Mode.SUBTRACT)


with BuildPart() as f1_9:
    add(f1_8.part)

    # F38_t60: cut F38_tool61
    add(f38_tool61.part, mode=Mode.SUBTRACT)

    # F42 (radius 1.5 in the source; OpenCascade refuses exactly that, so slightly less here)
    f42_edges = [f1_9.edges().sort_by_distance(p)[0] for p in [
        (30.914214, -9, 15.414214),
        (22, -9, 16),
        (22, -9, -2),
        (30.914214, -9, -1.414214),
        (31.5, -9, 7),
    ]]
    fillet(f42_edges, radius=F42_R)


solid = Compound([f17.part, f1_9.part])
